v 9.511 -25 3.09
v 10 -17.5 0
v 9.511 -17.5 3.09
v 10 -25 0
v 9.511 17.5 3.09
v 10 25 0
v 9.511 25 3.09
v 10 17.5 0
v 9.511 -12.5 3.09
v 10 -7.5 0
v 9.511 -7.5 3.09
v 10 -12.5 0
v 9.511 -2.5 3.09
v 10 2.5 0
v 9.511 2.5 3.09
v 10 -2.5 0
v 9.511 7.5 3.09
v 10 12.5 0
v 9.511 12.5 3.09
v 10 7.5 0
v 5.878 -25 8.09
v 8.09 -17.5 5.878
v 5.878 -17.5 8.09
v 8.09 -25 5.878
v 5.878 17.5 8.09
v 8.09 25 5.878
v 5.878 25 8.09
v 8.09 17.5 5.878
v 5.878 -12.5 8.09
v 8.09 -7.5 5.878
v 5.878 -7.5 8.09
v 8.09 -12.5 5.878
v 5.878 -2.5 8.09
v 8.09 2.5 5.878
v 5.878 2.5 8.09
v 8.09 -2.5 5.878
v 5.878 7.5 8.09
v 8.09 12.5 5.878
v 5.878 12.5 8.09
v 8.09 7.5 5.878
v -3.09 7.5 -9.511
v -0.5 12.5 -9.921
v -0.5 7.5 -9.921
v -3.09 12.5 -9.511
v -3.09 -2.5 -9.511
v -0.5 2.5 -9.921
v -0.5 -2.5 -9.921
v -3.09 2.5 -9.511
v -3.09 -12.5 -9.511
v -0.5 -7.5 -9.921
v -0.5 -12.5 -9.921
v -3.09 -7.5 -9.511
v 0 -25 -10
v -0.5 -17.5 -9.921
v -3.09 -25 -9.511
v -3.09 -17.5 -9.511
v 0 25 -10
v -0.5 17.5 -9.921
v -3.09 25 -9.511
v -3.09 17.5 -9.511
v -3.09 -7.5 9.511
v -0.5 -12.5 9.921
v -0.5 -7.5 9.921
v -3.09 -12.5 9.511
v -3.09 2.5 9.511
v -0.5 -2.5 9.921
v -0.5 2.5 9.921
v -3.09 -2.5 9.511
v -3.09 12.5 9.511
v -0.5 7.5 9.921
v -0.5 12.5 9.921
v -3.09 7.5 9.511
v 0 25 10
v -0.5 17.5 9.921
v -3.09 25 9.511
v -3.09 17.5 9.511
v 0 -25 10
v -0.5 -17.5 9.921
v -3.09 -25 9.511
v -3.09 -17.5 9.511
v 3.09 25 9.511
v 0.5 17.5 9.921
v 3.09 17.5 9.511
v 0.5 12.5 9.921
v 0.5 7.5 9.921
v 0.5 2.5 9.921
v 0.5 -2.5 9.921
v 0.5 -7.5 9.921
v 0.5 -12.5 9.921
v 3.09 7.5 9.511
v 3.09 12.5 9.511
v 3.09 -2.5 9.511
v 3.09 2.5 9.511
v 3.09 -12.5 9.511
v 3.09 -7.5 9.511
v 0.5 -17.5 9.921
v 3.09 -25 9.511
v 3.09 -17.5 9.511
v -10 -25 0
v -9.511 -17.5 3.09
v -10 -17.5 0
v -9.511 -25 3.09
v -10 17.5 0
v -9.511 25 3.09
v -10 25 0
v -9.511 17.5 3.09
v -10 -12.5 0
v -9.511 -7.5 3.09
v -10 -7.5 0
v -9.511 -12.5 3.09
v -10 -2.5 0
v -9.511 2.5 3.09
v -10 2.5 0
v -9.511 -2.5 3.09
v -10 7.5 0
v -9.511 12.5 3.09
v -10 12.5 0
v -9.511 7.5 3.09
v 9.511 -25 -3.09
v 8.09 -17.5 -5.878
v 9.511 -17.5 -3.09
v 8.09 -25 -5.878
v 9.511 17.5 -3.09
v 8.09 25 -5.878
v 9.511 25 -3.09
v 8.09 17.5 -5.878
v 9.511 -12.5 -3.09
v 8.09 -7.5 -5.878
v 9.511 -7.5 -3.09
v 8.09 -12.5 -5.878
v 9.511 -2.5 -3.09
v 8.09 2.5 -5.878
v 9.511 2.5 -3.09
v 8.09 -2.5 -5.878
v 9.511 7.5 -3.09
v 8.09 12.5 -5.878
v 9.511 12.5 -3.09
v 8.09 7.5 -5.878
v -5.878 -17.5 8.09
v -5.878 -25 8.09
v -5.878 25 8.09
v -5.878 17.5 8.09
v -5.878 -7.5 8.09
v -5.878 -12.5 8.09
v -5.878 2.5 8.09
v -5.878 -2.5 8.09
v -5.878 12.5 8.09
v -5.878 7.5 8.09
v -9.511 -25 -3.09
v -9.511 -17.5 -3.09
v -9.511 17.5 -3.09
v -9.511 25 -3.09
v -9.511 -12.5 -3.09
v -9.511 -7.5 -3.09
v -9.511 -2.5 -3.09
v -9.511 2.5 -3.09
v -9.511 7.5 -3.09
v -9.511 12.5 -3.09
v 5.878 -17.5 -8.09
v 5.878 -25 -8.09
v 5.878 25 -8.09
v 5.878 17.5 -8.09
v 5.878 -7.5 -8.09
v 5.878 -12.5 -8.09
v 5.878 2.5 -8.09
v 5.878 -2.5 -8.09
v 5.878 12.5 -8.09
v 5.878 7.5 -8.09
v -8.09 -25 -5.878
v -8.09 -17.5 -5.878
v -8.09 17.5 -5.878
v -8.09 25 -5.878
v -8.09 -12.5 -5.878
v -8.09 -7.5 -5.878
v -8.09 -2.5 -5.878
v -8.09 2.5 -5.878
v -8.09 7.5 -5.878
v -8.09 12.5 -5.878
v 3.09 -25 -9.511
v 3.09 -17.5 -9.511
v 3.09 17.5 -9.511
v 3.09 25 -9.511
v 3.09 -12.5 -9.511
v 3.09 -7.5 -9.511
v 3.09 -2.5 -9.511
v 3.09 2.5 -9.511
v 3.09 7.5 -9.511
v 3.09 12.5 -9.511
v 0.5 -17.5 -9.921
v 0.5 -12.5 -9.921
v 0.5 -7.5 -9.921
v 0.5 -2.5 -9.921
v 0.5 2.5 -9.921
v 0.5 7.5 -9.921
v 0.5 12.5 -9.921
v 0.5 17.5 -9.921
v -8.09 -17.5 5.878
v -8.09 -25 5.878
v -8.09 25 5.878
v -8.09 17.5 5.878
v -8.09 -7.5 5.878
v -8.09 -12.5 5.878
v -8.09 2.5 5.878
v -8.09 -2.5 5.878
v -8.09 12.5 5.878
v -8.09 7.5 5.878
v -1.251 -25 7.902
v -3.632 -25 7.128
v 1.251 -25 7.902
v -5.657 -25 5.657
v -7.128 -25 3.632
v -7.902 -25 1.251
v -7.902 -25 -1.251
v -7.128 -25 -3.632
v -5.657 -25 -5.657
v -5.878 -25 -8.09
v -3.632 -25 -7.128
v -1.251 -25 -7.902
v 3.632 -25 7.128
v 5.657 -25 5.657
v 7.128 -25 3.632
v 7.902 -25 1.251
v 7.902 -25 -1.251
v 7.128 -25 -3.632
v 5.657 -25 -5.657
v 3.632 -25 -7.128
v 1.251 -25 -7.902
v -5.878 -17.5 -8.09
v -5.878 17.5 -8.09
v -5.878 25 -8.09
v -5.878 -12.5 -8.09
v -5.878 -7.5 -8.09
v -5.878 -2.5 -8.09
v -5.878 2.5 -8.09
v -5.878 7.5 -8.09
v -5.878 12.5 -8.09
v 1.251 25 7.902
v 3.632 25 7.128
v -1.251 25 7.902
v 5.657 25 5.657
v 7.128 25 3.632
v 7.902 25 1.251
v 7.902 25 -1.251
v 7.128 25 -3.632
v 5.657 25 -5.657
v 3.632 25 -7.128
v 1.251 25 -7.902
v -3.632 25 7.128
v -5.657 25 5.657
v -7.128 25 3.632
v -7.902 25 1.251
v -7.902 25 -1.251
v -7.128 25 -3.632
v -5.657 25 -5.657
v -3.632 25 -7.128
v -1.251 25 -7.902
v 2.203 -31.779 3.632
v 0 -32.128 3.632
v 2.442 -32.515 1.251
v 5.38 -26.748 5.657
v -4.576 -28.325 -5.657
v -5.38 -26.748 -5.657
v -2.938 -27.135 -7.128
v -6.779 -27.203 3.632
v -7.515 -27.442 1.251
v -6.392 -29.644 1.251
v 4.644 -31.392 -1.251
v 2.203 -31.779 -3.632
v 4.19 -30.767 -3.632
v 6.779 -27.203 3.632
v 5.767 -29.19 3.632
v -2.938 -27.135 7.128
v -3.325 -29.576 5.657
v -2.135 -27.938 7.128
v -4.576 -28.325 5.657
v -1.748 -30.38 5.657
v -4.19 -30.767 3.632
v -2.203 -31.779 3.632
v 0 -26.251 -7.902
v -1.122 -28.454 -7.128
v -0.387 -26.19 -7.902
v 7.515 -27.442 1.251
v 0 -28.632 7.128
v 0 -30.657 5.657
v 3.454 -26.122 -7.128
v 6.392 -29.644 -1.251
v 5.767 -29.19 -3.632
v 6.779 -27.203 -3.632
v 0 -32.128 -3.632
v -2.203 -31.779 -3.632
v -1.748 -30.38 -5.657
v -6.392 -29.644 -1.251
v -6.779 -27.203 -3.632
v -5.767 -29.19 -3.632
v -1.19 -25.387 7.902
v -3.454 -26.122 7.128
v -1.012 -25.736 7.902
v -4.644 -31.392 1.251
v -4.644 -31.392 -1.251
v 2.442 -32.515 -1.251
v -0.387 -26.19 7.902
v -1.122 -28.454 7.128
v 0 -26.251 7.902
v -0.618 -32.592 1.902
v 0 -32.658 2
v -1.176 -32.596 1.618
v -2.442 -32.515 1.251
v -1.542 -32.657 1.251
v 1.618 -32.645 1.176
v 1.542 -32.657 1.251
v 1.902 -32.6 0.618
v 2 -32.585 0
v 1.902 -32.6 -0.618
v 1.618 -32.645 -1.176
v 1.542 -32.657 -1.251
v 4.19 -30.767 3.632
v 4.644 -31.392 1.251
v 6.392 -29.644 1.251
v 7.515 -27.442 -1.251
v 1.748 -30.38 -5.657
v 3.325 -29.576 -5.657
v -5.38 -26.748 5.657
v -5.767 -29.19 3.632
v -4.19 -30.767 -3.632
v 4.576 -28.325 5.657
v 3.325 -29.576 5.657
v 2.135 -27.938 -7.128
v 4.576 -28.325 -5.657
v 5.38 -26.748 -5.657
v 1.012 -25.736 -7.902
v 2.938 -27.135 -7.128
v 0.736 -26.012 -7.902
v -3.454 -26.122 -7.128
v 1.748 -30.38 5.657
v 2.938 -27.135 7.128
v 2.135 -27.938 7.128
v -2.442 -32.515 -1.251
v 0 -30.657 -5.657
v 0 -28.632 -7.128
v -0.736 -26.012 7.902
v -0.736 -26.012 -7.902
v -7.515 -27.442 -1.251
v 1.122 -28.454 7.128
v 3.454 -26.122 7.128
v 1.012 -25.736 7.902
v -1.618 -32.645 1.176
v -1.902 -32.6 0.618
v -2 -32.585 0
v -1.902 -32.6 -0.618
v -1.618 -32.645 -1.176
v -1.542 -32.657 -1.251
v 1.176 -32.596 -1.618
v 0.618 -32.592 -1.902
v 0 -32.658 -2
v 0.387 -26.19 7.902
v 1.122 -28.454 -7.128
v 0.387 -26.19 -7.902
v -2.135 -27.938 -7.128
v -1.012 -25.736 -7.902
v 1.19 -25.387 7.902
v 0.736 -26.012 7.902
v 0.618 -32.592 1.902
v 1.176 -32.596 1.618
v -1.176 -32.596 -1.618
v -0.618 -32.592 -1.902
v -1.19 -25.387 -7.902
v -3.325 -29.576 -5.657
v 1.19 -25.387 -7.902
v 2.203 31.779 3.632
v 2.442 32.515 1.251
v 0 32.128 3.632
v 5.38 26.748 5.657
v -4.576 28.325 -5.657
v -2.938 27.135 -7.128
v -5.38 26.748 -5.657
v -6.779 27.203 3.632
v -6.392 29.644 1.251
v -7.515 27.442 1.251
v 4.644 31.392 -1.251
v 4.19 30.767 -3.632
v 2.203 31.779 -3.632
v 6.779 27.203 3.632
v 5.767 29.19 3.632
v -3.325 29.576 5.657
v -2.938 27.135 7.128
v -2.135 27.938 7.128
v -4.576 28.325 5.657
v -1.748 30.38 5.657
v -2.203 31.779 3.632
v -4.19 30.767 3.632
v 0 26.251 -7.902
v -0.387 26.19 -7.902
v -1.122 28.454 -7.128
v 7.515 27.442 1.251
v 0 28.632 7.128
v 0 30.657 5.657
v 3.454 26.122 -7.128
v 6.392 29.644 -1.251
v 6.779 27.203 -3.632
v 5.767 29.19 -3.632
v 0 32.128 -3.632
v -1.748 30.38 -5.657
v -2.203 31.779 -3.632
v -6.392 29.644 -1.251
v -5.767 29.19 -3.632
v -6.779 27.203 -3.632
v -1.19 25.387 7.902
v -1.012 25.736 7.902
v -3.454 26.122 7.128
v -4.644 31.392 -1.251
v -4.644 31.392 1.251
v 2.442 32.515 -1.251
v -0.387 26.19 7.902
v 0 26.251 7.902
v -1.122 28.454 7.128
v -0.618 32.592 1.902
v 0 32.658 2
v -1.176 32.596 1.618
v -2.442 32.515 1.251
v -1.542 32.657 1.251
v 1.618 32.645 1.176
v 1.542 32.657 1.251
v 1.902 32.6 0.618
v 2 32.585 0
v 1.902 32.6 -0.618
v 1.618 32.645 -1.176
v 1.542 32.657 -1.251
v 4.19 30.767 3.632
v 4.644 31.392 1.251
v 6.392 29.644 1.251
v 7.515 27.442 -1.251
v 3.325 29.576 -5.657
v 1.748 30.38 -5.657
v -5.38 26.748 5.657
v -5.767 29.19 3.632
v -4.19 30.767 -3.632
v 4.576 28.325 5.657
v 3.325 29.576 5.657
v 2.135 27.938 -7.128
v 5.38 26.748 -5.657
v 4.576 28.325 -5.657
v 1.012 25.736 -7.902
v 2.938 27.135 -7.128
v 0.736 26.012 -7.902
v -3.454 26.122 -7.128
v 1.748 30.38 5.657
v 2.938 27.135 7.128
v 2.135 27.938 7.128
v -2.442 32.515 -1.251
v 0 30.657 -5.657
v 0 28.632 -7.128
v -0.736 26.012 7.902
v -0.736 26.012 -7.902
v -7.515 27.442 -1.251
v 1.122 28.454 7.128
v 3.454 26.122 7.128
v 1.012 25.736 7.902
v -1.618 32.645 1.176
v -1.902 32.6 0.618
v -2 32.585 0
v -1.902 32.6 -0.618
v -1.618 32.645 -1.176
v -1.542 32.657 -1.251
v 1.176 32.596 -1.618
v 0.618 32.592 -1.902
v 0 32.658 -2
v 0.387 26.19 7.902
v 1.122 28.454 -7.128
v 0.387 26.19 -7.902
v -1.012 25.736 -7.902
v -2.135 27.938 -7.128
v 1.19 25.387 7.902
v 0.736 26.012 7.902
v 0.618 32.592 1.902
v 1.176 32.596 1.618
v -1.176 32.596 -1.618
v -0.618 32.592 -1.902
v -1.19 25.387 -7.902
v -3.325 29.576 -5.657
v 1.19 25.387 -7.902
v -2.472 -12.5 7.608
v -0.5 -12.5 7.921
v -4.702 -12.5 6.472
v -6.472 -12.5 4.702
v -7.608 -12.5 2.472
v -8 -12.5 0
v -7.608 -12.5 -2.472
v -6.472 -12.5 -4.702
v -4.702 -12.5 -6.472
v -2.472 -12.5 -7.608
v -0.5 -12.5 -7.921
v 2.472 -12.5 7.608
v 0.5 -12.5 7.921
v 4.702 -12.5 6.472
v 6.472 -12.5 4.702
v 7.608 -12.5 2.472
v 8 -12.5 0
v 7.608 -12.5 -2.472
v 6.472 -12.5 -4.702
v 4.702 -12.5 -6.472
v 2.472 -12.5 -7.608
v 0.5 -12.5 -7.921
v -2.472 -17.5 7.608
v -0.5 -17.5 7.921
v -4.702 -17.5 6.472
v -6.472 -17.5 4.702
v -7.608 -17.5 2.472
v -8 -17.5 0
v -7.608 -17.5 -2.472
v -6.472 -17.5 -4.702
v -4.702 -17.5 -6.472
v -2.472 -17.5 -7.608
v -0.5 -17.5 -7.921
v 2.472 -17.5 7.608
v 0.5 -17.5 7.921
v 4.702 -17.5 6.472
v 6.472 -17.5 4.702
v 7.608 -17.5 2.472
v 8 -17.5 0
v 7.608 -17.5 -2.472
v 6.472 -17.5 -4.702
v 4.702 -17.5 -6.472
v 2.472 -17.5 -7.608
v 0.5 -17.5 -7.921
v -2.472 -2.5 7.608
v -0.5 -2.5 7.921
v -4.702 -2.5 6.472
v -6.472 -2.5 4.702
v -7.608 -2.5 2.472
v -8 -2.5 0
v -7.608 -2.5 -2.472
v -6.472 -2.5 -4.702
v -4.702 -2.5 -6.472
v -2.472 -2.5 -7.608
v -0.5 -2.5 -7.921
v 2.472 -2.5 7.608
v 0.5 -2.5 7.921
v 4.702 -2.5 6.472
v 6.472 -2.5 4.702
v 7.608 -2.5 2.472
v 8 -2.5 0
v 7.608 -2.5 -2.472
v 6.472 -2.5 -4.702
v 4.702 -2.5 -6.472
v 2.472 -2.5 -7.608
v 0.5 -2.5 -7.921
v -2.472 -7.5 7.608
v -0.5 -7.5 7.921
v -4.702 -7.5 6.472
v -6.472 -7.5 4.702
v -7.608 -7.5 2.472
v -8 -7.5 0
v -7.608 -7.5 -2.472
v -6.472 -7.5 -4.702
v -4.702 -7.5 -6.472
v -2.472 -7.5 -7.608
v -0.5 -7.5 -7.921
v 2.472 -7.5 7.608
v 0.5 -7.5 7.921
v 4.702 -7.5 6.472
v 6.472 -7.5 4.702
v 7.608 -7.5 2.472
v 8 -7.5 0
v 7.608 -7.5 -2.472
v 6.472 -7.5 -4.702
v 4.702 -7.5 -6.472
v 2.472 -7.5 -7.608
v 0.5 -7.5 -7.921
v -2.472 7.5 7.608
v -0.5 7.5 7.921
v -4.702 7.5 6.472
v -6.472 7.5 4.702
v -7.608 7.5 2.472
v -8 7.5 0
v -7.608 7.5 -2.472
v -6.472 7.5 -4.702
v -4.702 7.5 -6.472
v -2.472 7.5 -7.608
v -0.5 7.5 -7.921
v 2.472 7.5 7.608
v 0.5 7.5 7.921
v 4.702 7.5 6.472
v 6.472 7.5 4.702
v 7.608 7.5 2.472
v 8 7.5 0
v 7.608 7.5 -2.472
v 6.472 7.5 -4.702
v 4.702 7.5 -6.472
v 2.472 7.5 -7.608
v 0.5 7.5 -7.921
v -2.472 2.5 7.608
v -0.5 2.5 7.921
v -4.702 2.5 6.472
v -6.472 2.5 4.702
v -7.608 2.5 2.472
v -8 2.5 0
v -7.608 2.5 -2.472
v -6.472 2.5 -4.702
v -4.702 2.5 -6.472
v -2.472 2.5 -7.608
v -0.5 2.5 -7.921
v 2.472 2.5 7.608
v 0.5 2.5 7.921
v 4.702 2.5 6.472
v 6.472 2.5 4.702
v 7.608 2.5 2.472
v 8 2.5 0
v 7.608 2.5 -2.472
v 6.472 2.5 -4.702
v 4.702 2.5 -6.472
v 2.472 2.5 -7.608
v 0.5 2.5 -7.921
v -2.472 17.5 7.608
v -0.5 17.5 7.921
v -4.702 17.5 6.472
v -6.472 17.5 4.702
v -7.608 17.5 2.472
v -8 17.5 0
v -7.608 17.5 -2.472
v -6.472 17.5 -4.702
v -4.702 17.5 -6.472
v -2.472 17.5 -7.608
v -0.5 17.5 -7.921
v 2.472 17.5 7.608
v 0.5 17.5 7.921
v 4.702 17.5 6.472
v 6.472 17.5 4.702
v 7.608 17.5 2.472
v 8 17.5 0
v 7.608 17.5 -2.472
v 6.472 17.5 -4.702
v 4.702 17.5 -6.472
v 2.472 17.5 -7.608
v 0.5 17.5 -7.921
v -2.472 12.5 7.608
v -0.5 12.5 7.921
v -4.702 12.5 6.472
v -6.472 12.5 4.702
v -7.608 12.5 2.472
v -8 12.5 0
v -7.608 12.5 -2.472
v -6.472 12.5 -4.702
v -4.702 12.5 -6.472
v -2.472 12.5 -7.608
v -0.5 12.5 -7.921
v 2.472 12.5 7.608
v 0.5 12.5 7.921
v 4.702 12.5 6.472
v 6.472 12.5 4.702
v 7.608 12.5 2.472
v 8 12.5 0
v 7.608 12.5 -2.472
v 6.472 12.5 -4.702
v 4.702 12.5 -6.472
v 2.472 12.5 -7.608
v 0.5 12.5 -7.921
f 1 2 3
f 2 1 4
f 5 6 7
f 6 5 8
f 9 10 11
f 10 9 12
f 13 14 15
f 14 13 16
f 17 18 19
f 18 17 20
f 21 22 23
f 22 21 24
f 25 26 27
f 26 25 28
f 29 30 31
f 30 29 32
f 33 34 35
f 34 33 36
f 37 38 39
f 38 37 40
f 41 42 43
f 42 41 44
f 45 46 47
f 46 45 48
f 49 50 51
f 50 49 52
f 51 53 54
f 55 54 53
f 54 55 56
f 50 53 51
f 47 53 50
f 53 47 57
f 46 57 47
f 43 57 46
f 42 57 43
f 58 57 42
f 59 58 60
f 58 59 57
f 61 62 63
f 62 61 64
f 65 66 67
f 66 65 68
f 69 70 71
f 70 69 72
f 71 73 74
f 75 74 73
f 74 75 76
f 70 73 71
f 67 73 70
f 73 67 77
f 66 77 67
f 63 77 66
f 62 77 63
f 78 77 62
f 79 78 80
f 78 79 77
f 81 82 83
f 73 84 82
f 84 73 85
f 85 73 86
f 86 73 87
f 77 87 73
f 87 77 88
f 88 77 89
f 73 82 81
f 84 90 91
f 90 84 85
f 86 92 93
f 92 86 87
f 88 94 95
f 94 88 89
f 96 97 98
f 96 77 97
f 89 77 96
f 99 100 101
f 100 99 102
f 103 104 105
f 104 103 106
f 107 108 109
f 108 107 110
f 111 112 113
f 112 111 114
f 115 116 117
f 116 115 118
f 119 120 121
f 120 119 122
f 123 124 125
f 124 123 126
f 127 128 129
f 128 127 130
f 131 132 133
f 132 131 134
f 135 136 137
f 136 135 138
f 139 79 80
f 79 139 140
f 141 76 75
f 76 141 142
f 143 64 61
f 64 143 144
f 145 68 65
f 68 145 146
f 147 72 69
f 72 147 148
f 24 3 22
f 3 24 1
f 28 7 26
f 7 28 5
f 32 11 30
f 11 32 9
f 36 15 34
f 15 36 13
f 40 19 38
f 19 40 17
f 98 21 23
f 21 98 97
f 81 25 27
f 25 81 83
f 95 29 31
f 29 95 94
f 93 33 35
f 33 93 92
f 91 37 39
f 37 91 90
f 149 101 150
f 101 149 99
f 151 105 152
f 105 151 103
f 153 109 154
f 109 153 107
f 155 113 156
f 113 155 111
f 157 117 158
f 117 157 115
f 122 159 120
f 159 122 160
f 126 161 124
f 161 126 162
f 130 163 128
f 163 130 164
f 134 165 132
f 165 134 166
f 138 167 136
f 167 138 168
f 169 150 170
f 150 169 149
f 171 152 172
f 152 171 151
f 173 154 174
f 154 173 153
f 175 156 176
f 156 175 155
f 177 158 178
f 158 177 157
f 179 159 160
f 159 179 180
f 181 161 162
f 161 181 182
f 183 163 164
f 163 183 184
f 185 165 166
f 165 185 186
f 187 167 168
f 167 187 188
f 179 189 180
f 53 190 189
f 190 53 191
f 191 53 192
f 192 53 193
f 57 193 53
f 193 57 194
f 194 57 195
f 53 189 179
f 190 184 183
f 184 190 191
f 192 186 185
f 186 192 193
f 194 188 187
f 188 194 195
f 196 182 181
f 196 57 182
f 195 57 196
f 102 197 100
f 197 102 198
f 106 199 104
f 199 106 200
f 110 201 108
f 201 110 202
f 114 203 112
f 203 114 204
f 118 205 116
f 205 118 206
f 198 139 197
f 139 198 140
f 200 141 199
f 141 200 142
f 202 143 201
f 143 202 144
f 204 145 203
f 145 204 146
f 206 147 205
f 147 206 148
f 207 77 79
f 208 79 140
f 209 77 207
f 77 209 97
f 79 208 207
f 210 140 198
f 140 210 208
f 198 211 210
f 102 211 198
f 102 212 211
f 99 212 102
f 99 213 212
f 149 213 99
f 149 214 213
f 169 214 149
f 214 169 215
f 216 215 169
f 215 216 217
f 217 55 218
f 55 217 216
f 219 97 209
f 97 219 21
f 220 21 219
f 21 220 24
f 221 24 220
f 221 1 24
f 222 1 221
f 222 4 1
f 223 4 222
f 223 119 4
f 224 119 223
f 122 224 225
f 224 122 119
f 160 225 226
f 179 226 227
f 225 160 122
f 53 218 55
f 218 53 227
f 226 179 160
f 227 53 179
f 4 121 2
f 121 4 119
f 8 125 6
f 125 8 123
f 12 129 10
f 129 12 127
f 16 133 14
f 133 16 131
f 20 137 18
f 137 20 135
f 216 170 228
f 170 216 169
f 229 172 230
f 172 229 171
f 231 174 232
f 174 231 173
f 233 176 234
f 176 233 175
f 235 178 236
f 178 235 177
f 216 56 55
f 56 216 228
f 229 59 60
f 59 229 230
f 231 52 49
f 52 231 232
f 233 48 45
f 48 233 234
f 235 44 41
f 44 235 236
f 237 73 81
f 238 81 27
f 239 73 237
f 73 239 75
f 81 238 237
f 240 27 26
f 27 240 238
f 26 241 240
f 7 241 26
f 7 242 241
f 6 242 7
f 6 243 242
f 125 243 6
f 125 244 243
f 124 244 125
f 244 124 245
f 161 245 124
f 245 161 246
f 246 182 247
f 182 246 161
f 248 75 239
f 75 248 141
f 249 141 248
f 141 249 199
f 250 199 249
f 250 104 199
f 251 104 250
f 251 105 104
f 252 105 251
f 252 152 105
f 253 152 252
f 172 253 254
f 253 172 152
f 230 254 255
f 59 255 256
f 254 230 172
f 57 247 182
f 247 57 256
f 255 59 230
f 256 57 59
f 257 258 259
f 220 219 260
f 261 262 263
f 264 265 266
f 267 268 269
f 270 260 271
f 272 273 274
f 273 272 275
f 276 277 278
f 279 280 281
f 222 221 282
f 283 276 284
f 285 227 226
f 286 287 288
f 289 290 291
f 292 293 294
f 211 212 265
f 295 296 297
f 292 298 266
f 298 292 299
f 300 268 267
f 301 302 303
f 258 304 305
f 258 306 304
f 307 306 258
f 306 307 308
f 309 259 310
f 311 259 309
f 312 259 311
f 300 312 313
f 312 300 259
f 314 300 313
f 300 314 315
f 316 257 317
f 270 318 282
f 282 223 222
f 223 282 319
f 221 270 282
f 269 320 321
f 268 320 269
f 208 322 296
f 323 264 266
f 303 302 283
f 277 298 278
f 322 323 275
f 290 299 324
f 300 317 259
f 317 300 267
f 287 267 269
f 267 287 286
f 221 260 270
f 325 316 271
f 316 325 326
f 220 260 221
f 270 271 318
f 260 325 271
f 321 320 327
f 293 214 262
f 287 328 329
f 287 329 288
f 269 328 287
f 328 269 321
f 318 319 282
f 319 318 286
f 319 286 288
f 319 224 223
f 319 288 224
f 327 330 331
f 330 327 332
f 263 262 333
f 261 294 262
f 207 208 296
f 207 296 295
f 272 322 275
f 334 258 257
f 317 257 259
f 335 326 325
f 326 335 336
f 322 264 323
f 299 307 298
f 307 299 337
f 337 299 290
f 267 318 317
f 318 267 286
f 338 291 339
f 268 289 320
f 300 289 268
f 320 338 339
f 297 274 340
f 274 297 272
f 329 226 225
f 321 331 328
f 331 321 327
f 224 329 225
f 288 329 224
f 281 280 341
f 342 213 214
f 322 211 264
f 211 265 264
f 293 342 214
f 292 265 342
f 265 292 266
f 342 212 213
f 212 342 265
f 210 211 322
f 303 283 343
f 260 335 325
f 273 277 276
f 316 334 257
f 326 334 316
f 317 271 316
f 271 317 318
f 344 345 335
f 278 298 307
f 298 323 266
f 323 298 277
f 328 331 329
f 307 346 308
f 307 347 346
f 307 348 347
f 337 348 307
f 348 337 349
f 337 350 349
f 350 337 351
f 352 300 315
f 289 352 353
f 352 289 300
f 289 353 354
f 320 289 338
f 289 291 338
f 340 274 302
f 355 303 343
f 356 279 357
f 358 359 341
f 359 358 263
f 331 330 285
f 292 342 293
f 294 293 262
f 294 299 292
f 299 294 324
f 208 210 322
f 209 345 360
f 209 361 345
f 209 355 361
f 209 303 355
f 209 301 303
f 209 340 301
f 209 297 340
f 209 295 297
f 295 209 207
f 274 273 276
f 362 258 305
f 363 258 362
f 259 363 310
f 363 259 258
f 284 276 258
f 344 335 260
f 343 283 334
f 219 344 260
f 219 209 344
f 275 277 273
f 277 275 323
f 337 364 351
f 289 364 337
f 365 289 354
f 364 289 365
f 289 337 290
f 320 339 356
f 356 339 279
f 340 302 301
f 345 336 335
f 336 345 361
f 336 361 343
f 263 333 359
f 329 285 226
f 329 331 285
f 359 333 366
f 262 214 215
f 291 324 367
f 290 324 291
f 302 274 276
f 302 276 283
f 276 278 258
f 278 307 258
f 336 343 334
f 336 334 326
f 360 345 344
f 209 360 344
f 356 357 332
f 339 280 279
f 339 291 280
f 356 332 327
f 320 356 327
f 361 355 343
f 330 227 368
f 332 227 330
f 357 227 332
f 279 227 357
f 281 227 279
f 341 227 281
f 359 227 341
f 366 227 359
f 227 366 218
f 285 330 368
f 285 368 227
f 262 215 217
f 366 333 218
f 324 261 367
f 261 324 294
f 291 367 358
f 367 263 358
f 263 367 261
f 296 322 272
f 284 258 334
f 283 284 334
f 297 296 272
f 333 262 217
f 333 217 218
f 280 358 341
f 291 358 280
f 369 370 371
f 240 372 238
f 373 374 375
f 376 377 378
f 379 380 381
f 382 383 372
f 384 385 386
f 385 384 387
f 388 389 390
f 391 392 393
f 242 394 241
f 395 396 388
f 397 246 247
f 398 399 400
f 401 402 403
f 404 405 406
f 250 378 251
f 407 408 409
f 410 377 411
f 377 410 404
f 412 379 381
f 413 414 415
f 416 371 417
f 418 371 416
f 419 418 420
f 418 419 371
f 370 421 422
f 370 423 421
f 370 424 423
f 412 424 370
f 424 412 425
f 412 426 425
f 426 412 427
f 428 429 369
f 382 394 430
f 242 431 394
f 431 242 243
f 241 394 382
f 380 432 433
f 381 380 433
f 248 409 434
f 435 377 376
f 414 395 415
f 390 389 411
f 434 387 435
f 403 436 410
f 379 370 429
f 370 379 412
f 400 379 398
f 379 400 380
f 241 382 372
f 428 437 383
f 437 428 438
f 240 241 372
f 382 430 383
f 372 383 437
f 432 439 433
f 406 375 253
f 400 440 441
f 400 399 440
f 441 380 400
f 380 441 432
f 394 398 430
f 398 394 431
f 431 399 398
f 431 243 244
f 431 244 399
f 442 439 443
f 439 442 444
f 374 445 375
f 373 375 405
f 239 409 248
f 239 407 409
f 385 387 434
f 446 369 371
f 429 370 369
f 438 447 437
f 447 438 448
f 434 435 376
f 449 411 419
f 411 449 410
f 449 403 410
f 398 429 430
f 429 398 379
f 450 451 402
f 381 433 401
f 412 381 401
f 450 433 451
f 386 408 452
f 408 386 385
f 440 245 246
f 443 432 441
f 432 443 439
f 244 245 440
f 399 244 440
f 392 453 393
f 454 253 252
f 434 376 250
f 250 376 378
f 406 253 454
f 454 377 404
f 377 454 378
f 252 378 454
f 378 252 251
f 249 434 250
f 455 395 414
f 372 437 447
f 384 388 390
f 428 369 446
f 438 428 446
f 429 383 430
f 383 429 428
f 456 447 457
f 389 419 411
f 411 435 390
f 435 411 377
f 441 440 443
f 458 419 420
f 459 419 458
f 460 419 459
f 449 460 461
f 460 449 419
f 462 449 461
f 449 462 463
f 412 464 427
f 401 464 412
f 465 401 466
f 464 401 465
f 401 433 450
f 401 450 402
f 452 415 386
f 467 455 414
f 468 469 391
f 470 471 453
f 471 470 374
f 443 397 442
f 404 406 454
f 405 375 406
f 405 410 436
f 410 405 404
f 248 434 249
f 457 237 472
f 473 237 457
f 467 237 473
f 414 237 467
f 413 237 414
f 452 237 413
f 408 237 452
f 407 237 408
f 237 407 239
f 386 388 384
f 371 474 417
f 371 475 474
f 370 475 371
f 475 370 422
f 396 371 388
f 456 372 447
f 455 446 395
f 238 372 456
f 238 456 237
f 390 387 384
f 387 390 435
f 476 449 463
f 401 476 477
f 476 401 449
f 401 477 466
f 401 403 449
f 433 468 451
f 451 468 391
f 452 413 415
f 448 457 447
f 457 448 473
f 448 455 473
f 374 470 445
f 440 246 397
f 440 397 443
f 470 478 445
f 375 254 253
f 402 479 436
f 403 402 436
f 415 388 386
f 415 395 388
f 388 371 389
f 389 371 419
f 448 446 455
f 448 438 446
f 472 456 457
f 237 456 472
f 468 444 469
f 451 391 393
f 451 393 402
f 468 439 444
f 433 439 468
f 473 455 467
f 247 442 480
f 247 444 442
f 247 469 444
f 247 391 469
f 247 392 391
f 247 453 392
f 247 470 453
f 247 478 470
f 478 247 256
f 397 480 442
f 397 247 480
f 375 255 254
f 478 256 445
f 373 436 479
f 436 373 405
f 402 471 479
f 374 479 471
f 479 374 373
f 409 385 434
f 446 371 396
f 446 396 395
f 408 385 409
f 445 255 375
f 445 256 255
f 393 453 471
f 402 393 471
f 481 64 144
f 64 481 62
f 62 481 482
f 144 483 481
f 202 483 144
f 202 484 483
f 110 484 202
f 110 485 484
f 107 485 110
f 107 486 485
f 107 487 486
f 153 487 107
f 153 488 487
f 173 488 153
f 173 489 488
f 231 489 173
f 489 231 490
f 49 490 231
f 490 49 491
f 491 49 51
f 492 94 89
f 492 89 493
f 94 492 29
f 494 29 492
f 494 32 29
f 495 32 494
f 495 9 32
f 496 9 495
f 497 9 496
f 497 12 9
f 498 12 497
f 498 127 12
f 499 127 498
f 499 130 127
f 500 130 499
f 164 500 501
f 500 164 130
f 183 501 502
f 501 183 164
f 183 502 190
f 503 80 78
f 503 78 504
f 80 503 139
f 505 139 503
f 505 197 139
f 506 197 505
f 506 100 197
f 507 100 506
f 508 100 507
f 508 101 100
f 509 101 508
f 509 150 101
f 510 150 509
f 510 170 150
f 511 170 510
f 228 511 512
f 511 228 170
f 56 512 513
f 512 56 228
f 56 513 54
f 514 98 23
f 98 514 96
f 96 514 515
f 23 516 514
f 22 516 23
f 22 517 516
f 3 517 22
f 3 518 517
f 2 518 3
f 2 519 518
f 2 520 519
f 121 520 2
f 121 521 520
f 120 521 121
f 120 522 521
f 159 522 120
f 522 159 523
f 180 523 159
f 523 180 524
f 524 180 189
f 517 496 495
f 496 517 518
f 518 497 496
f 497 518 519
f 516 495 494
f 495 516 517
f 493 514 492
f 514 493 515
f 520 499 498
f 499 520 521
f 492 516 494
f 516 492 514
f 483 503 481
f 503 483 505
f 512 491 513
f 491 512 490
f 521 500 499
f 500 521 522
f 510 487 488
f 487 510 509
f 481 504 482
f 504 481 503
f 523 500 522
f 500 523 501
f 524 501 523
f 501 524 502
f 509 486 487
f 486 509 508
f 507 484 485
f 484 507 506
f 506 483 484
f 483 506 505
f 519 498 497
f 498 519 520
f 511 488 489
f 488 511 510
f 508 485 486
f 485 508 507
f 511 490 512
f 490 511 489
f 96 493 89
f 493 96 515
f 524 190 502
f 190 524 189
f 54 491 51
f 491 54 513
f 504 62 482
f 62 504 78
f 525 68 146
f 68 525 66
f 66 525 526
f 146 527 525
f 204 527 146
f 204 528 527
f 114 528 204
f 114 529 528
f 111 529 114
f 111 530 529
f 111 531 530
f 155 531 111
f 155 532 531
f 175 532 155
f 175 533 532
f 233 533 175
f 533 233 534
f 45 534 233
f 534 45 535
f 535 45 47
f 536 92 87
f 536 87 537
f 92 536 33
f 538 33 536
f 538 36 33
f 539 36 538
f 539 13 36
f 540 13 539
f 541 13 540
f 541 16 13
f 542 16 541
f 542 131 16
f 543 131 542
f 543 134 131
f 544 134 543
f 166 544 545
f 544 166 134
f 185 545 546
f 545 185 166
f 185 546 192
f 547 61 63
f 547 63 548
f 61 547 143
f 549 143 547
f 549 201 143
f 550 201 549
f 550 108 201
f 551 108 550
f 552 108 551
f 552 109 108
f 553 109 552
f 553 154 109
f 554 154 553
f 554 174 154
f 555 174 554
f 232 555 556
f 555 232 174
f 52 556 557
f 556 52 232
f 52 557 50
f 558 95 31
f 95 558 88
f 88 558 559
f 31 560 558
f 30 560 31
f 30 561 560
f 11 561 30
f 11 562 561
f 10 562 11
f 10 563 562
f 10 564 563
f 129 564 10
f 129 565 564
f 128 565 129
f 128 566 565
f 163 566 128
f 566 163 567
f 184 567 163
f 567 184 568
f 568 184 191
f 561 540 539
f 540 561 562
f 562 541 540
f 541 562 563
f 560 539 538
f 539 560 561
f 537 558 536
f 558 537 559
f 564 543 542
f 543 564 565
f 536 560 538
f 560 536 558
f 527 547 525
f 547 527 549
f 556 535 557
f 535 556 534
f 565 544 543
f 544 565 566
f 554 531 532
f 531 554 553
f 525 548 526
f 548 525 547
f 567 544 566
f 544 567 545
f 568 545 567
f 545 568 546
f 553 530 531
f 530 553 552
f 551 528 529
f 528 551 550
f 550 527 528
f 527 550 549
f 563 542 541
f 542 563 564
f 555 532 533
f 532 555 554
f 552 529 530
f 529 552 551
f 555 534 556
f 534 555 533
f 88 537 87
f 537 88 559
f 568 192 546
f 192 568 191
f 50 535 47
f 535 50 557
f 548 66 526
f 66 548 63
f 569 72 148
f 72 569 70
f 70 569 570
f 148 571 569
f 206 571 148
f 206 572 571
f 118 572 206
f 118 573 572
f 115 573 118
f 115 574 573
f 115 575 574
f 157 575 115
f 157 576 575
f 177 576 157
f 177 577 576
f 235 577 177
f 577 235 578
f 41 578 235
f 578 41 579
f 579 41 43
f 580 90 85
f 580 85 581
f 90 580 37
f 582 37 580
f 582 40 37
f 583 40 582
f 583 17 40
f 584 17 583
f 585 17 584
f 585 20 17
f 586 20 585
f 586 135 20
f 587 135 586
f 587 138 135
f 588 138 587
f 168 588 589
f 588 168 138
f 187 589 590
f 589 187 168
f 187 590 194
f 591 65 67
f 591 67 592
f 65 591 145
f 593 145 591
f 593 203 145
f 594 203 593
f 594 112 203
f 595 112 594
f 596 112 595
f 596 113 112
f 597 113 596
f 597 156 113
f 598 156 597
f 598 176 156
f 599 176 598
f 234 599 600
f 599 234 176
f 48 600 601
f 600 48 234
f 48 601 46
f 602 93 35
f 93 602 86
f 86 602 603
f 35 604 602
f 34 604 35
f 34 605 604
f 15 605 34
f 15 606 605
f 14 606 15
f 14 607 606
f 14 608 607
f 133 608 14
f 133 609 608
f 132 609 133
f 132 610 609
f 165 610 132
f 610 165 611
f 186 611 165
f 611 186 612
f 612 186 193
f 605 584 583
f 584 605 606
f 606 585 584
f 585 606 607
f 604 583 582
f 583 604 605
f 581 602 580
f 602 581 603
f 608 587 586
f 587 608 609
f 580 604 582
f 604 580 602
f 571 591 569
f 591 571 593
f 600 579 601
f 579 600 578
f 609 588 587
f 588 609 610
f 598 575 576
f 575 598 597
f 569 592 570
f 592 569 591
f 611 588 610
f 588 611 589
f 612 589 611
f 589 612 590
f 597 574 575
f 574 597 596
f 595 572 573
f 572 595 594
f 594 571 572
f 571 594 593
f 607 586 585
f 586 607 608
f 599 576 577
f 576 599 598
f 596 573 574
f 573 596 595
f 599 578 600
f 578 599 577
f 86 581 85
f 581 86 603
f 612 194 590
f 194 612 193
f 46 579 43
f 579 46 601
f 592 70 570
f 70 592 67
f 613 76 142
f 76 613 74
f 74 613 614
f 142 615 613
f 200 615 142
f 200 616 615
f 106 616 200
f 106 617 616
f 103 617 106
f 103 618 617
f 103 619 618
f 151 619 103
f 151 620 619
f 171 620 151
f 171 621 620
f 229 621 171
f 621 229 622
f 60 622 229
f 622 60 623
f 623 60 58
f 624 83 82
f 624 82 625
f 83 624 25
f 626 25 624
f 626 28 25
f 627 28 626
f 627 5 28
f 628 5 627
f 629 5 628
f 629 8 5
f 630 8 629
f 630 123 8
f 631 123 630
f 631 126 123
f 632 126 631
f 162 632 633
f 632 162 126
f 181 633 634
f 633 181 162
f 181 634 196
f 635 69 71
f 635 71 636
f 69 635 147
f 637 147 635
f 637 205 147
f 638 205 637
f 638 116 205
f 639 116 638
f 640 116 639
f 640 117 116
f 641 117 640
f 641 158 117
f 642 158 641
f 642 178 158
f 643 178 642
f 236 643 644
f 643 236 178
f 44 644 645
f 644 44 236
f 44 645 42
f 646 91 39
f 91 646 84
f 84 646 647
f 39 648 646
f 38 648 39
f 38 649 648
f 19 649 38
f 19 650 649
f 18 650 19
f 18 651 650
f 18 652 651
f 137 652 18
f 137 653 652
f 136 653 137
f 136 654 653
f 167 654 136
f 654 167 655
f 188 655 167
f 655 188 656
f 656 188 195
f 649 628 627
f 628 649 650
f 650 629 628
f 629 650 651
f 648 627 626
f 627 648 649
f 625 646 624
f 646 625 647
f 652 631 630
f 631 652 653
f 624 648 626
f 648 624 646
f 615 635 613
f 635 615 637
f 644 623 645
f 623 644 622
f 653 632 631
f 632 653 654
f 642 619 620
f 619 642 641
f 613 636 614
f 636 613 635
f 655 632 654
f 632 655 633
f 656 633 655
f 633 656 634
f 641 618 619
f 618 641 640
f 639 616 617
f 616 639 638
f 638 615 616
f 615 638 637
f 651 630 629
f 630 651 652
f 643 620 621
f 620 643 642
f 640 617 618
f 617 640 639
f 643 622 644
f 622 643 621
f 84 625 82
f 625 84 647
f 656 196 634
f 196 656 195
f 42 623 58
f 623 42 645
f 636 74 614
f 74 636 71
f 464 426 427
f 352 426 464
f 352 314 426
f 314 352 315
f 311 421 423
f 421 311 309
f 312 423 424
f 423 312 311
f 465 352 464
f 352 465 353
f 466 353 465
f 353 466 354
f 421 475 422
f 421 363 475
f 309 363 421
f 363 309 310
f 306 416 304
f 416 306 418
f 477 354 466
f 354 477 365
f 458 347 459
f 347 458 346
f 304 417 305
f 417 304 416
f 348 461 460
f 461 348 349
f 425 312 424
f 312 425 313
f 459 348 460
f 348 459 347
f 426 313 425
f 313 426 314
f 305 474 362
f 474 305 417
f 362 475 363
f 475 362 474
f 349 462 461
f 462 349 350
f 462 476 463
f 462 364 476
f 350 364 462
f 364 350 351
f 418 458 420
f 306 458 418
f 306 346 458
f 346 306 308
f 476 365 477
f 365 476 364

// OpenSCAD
// file: Mirror.scad
module mirrorXY(Pos=[10,10,0])
 {
    translate(Pos)
        children();
    
    mirror([1,0,0])
        translate(Pos)
            children();
    mirror([0,1,0])
        translate(Pos)
           children();

    mirror([1,0,0])
        mirror([0,1,0])
            translate(Pos)
                children();
}

// Módulos
module mirrorX(Pos=[10,10,0])
 {
    translate(Pos)
        children(); 
    mirror([1,0,0])
        translate(Pos)
            children();
}

module mirrorY(Pos=[10,10,0])
 {
    translate(Pos)
        children(); 
    mirror([0,1,0])
        translate(Pos)
           children();
}

module mirrorZ(Pos=[10,10,0])
 {
    translate(Pos)
        children(); 
    mirror([0,1,0])
        translate(Pos)
           children();
}
// file: gears.scad
// library for parametric involute gears 
// Author: Rudolf Huttary, Berlin 
// Jan 2015

$fn = 500; 
iterations = 10; // increase for enhanced resolution beware: large numbers will take lots of time!

// default values
// z = 10; // teeth - beware: large numbers may take lots of time!
// m = 1;  // modulus
// x = 0;  // profile shift
// h = 4;  // face_width	respectivly axial height
// w = 20; // profile angle
// clearance  // assymmetry of tool to clear tooth head and foot
//    = 0.1; // for external splines
//    = -.1  // for internal splines 
// w_bevel = 45; // axial pitch angle
// w_helix = 45; // radial pitch angle 

// use this prototype:
// gear(m = modulus, z = Z, x = profile_shift, w = alpha, h = face_width);

//====  external splines with default values ===
// gear();  
// gear_helix(); 
// gear_herringbone(); 
 gear_bevel(m = 5, 
 z = 10,    // Numero de dientes
 x = 0,     
 h = 6,   // Altura de la rueda
 w = 25,   // angulo de los dientes
 w_bevel = 45, // Ángulo de la rueda
 w_helix = 0, 
 D = 50, 
 clearance = -0.1, 
 center = true); 

//====  internal splines with default values ===
// Gear();  
// Gear_helix(); 
// Gear_herringbone(); 
// Gear_bevel(); 
// 

//====  internal splines - usage and more examples ===
// gear(z = 25, m = 1, x = -.5, h = 4); 
// gear_bevel(z = 26, m = 1, x = .5, h = 3, w_bevel = 45, w_helix = -45); 
// gear_helix(z = 16, m = 0.5, h = 4, w_helix = -20, clearance = 0.1); 
// gear_herringbone(z = 16, m = 0.5, h = 4, w_helix = -20, clearance = 0.1); 


//====  external splines - usage and more examples ===
// Gear(z = 10, m = 1.1, x = 0, h = 2, w = 20, D = 14, clearance = -0.2); 
// gear(z = 10, m = 1, x = .5, h = 4, w = 20, D = 13, clearance = 0.2); 

//Gear_herringbone(z = 40, m = 1, h = 4, w_helix = 45, clearance = -0.2, D = 49); 
// gear_herringbone(z = 40, m = 1, h = 4, w_helix = 45, clearance = 0.2); 

// Gear_helix(z = 20, m=1.3, h = 15, D = 30, w_helix = 45, clearance = -0.2); 
// gear_helix(z = 20, m=1.3, h = 15, w_helix = 45, clearance = 0.2); 


// ====  grouped examples ===
//	di = 18; //axial displacement
//	translate([di, di])   Gear(z = 25, D=32); 
//	translate([-di, di])  Gear_helix(z = 25, D=32); 
//	translate([-di, -di]) Gear_herringbone(z = 25, D=32); 
//	translate([di, -di])  Gear_bevel(z = 25, D=32); 
//	
//	di = 8; //axial displacement
//	translate([di, di])   gear(); 
//	translate([-di, di])  gear_helix(); 
//	translate([-di, -di]) gear_herringbone(); 
//	translate([di, -di])  gear_bevel(); 

// profile shift examples
//	di = 9.5; //axial displacement
//	gear(z = 20, x = -.5); 
//	translate([0, di+3]) rotate([0, 0, 0]) gear(z = 7, x = 0, clearance = .2); 
//	translate([di+3.4, 0]) rotate([0, 0, 0]) gear(z = 6, x = .25); 
//	translate([0, -di-3]) rotate([0, 0, 36])   gear(z = 5, x = .5); 
//	translate([-di-3.675, 0]) rotate([0, 0, 22.5]) gear(z = 8, x = -.25); 
 

// tooth cutting principle - dumping frames for video
//	du = PI/36; 
//	i = -($t-.5)*72; 
//	rotate([0, 0, i])
//	translate([i*du, 0, 0])
//	Tool(); 
//	Tooth_half(); 



// === modules for internal splines
module Gear(m = 1, z = 10, x = 0, h = 4, w = 20, D = 13, clearance = -.1, center = true) 
{
   difference()
   {
		cylinder(r = D/2, h = h, center = center);
		gear(m, z, x, h+1, w, center = center, clearance = clearance); 
	}
}

module Gear_herringbone(m = 1, z = 10, x = 0, h = 4, w = 20, w_helix = 45, D = 13, clearance = -.1) 
{
   difference()
   {
		cylinder(r = D/2, h = h-.01, center = true); // CSG!
		gear_herringbone(m, z, x, h, w, w_helix, clearance = clearance); 
	}
}

module Gear_helix(m = 1, z = 10, x = 0, h = 4, w = 20, w_helix = 45, D = 13, clearance = -.1) 
{
   difference()
   {
		cylinder(r = D/2, h = h-.01, center = true); // CSG!
		gear_helix(m, z, x, h, w, w_helix, clearance = clearance); 
	}
}

module Gear_bevel(m = 1, z = 10, x = 0, h = 4, w = 20, w_bevel = 45, w_helix = 0, D = 13, clearance = -0.1, center = true)
{
   rotate([0, 180, 0])
   difference()
   {
		cylinder(r = D/2, h = h-.01, center = true); // CSG!
		gear_bevel(m, z, x, h, w, w_bevel, w_helix, clearance = clearance, center = center); 
	}
}


// === modules for external splines
module gear_herringbone(m = 1, z = 10, x = 0, h = 4, w = 20, w_helix = 45, clearance = 0.1)
{
   for(i=[0, 1])
   mirror([0,0,i])
   translate([0, 0, -0.001]) // CSG!
   gear_helix(m, z, x, h/2, w, w_helix, center = false, clearance = clearance); 
}

module gear_helix(m = 1, z = 10, x = 0, h = 4, w = 20, w_helix = 45, center = true, clearance = 0.1)
{
   gear_info(m, z, x, h, w, w_helix, 0, clearance); 
	r_wk = m*z/2 + x; 
   tw = (h * w_helix)/ r_wk  ; 
	linear_extrude(height = h, center = center, twist = tw, slices = ceil(10*h), convexity = z)
   gear_(m, z, x, w, clearance); 
}

module gear_bevel(m = 1, z = 10, x = 0, h = 4, w = 20, w_bevel = 45, w_helix = 0, clearance = 0.1, center = true)
{
   gear_info(m, z, x, h, w, 0, w_bevel, clearance); 
	r_wk = m*z/2 + x; 
   sc = (r_wk-tan(w_bevel)*h)/r_wk; 
   tw = (h * w_helix)/ r_wk  ; 
	linear_extrude(height = h, center = center, twist = tw, scale = [sc, sc], convexity = z)
   gear_(m, z, x, w, clearance); 
}

module gear(m = 1, z = 10, x = 0, h = 4, w = 20, clearance = 0.1, center = true)
{
   gear_info(m, z, x, h, w, clearance = clearance); 
	linear_extrude(height = h, center = center, convexity = z)
   gear_(m, z, x, w, clearance); 
}

module gear_info(m = 1, z = 10, x = 0, h = 0, w = 20, helix_angle = 0, bevel_angle = 0, clearance = 0.1)
{
  	r_wk = m*z/2 + x; 
   	dy = m;  
  	r_kk = r_wk + dy;   
  	r_fk = r_wk - dy;  
  	r_kkc = r_wk + dy *(1-clearance/2);   
  	r_fkc = r_wk - dy *(1+clearance/2);  
   echo(str ("modulus = ", m)); 
   echo(str ("Z = ", z)); 
   echo(str ("profile angle = ", w, "°")); 
   echo(str ("d = ", 2*r_wk)); 
   echo(str ("d_outer = ", 2*r_kk, "mm")); 
   echo(str ("d_inner = ", 2*r_fk, "mm")); 
   echo(str ("height = ", h, "mm")); 
   echo(str ("clearance factor = ", clearance)); 
   echo(str ("d_outer_cleared = ", 2*r_kkc, "mm")); 
   echo(str ("d_inner_cleared = ", 2*r_fkc, "mm")); 
   echo(str ("helix angle = ", helix_angle, "°")); 
   echo(str ("bevel angle = ", bevel_angle, "°")); 
   echo("================"); 
}

// === from here 2D stuff == 
module gear_(m = 1, z = 10, x = 0, w = 20, clearance = 0.1)
{
  	r_wk = m*z/2 + x; 
   	dy = m;  
  	r_fkc = r_wk - dy *(1+clearance/2)+.01;  //.01 has numerical reason!
   union()
	{
		for(i = [0:z-1]) 
			rotate([0, 0, i*360/z])
			Tooth(m, z, x, w, clearance);
     circle(r_fkc); 
	}
}

module Tooth(m = 1, z = 10, x = 0, w = 20, clearance = 0)
{
	union()
	{
		Tooth_half(m, z, x, w, clearance); 
		mirror([1, 0, 0])
		Tooth_half(m, z, x, w, clearance); 
	}
}

module Tooth_half(m = 1, z = 10, x = 0, w = 20, clearance = 0)
{
  	r_wk = m*z/2 + x; 
  	r_fkc = r_wk - m *(1+clearance/2);   
	du = z*m/360*PI; 
	dw = 360/z; 
 	difference()
	{
		cake_piece(m, z, x, w, clearance); 
      	union()
		{
			for(i = [-dw:dw/iterations:dw])
			  rotate([0, 0, i])
			  translate([i*du, 0, 0])
			Tool(m, z, x, w, clearance); 
		}
	}
}

module Tool(m = 1, z = 10, x = 0, w = 20, clearance = 0)
{
   p = m*PI; 
   dy = 2*m;  
   dx = dy * tan(w);  
   ddx = dx/2 * clearance/2; 
   ddy = dy/2 * clearance/2; 
	r_wk = m*z/2 + x; 
   polygon(points = [
		[0, r_wk+dy], 
		[0, r_wk+dy/2-ddy], 
		[p/4-dx/2 + ddx, r_wk+dy/2 - ddy], 
		[p/4+dx/2 + ddx, r_wk-dy/2 - ddy], 
		[p/2,            r_wk -dy/2 - ddy],
		[p/2,            r_wk +dy/2 - ddy],
		[p/2,            r_wk+dy], 
		]);  
}

module cake_piece(m = 1, z = 10, x = 0, w = 20, clearance = 0)
{
	$fn = 50; 
	r_wk = m*z/2 + x; 
   p = m*PI; 
   dy = p/2*cos(w);  
   r_kk = r_wk + dy*(1+clearance);   
   intersection()
   {
     half_circle(r_kk); 
     rotate([0, 0, 180])
     rotate([0, 0, -181/z]) // 181 has numerical reason!
     half_circle(r_kk); 
	}
}

module half_circle(r)
{
	intersection()
  	{
		circle(r = r); 
     translate([0, -r, 0])
     square(2*r); 
	}
}
// main file
use<gears.scad>;
use<Mirror.scad>;
use<publicDomainGear.scad>;

$fn=20;

radio_probe=10;
length_section=10;


separation=5*pow(sin(180*$t),2); // Se puede animar!!
distance_sections=separation+length_section;
number_parts=5;
radio_cable=2;
ancho_electrodo=5;
grosor_electrodo=2;
grosor_separacion_vertical=1;


module probe(){
difference(){
    union(){
    translate([0,-(distance_sections*(number_parts-1))/2,0])
    for (aux=  [0:number_parts-1])
        {
            translate([0,aux*distance_sections,0])
            rotate([90,0,0])
                cylinder(r=radio_probe, h=length_section,center=true);
        }


    mirrorY([0,-(distance_sections*(number_parts-1)+length_section)/2,0])
        difference(){
        sphere(r=radio_probe);
            difference(){
                sphere(r=radio_probe);
                sphere(r=radio_probe-grosor_electrodo);
            }
        }
    }

  

    
    rotate([90,0,0]) 
    cylinder(h=(distance_sections*number_parts +radio_probe*2),r=radio_cable, center=true);
    
    translate([0,-(distance_sections*(number_parts-2))/2,0])
    for (aux=  [0:number_parts-2])
        {
            translate([0,aux*distance_sections,0])
            rotate([90,0,0])
                difference(){
                    cylinder(r=radio_probe+1, h=ancho_electrodo+separation,center=true);
                    cylinder(r=radio_probe-grosor_electrodo, h=length_section+1+separation,center=true);
                    cube([grosor_separacion_vertical,radio_probe*3,ancho_electrodo*2],center=true);
                }
        }
        
}
}

probe();
    
